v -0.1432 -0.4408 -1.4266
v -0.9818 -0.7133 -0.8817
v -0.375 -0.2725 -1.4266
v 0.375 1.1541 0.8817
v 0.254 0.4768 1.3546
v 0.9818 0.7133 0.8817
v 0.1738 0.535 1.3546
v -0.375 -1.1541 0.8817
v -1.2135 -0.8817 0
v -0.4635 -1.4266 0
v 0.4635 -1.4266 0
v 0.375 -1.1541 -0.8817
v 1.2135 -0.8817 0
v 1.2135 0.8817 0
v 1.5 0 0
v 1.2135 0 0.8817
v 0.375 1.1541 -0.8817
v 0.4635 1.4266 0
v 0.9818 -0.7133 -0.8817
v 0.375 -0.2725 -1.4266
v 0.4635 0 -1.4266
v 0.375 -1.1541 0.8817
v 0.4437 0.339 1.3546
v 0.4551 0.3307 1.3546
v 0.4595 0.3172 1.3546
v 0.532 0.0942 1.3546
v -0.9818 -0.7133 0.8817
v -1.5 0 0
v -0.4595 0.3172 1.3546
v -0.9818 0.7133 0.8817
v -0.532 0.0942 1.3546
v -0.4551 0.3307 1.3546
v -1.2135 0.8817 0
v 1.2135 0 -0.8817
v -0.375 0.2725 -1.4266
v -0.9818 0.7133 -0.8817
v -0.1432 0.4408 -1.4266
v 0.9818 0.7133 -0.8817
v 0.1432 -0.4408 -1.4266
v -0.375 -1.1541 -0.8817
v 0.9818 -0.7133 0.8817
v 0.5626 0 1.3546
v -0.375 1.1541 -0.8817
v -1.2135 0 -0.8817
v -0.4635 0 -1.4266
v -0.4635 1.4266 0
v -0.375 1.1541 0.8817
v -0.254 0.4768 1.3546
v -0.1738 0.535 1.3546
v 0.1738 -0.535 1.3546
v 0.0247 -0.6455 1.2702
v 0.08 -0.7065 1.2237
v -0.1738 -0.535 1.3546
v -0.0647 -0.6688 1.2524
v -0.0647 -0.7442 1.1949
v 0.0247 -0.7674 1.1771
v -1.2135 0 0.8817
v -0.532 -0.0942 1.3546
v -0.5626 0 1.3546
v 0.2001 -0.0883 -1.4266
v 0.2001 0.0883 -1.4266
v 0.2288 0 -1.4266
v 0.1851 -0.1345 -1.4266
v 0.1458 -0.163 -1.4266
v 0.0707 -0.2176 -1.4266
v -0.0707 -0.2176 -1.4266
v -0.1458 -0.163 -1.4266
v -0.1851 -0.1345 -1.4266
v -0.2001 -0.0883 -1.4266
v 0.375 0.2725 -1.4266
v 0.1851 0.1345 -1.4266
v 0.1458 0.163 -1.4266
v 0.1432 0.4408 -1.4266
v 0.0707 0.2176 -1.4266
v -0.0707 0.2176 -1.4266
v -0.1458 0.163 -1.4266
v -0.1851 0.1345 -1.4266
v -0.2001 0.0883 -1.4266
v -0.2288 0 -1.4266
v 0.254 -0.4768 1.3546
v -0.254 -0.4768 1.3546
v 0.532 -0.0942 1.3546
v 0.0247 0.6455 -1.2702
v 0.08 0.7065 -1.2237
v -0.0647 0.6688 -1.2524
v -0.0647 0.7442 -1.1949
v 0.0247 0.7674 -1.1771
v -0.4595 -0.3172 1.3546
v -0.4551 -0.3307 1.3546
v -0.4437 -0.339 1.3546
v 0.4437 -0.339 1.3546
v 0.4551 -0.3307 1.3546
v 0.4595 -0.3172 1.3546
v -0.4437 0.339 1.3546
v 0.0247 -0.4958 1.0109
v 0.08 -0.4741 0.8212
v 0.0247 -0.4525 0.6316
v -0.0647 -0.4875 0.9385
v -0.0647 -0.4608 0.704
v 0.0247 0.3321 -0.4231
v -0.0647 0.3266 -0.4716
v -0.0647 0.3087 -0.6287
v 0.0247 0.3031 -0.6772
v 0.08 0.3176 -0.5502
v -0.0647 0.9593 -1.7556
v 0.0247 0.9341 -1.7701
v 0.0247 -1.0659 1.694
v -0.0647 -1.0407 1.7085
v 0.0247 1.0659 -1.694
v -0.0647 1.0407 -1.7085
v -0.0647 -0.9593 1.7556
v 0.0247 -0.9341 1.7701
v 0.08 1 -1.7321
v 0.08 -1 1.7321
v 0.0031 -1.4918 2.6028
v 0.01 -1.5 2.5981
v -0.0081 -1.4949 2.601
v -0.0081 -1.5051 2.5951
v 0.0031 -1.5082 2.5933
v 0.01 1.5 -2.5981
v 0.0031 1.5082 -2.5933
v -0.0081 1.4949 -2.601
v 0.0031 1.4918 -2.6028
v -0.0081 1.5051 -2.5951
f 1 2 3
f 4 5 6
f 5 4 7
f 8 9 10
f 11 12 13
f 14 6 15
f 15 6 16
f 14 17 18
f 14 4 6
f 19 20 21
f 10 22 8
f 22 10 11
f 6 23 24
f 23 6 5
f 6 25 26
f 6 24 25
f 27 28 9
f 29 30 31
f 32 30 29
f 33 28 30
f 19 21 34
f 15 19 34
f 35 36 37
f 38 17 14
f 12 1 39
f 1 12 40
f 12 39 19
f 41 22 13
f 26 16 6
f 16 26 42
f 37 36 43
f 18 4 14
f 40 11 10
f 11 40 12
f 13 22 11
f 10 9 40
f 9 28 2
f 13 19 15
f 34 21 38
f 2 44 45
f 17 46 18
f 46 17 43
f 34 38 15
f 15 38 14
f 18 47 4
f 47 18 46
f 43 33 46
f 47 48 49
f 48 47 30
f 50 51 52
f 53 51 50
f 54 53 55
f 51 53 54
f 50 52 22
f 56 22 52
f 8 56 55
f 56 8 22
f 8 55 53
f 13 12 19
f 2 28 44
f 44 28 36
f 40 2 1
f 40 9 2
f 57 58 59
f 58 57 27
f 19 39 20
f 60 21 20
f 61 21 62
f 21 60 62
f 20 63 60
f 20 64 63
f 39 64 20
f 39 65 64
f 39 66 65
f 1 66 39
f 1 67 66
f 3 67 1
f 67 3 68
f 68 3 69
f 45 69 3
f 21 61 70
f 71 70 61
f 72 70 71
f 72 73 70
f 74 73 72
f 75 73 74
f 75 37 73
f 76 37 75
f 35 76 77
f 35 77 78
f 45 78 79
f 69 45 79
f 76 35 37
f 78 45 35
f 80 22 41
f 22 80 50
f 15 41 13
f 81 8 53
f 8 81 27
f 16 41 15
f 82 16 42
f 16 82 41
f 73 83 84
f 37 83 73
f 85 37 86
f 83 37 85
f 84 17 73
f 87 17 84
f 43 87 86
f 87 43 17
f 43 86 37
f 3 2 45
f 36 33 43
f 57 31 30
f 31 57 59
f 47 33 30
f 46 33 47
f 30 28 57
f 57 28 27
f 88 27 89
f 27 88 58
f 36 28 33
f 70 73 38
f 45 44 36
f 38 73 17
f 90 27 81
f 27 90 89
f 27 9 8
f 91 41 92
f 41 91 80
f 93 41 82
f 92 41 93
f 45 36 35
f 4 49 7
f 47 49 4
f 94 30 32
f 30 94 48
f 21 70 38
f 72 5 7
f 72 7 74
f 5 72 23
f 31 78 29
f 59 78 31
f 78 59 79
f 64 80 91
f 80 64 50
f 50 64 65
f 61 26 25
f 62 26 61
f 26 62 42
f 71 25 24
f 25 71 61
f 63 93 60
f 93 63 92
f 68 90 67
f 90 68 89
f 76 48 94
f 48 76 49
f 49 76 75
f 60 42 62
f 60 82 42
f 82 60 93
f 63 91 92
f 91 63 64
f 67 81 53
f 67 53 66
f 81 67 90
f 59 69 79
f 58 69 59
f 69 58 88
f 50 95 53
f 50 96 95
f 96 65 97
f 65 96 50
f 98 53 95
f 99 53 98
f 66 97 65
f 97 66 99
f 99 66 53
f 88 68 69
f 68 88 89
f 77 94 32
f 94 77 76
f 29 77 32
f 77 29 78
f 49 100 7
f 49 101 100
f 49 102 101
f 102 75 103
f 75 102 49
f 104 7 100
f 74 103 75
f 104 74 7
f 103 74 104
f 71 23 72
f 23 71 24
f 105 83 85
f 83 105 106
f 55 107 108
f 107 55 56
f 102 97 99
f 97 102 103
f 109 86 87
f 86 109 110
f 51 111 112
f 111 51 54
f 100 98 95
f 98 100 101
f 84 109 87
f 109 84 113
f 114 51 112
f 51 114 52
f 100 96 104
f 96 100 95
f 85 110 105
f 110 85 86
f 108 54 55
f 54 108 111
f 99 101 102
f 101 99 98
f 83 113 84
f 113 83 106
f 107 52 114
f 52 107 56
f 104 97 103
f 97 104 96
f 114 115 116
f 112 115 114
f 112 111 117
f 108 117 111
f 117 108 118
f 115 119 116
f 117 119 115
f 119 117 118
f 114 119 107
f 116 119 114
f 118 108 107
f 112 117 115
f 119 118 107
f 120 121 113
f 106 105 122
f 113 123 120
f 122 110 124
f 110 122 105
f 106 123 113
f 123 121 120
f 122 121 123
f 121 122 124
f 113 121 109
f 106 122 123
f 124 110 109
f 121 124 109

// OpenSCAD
color ("Olive")
difference () {
	sphere (d=3, $fn=10, center = true);
   cylinder(h = 5, r1 = .1, r2 = .7, $fn=10, center = true);
}
rotate([30, 0, 0]){
cylinder (h = 4, r = .08, $fn=5, center=true);
translate ([0, 0, 2.5])
   cylinder(h = 1, r1 = .08, r2 = .01, $fn=5, center = true);
translate ([0, 0, -2.5])
   cylinder(h = 1, r1 = .01, r2 = .08, $fn=5, center = true);
 }    
